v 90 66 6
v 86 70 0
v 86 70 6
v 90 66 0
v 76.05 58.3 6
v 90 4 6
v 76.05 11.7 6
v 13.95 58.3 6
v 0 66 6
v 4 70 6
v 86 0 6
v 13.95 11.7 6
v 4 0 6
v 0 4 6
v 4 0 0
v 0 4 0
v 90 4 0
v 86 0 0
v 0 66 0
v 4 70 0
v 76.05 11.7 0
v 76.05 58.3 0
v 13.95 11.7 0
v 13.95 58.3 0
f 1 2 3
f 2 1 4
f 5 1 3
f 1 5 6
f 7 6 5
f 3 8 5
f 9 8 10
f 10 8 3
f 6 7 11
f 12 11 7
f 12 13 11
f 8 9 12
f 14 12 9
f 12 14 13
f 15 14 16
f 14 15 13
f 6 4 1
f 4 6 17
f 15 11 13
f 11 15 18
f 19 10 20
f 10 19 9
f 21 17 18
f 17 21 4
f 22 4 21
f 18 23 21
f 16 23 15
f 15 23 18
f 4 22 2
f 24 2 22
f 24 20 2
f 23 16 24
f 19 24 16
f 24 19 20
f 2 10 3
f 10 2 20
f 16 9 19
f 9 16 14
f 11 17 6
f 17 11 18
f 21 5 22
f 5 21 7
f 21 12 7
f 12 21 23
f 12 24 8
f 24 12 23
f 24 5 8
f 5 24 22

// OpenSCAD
$fn = 32;

// ----------------------------------------------------------------------
// Windowed plate: 1 voids, 90 x 70 x 6 mm
// ----------------------------------------------------------------------

// --- parameters (mm) ---
plate_l = 90;             // plate length, X
plate_w = 70;             // plate width, Y
plate_t = 6;              // plate thickness, Z
edge_margin = 8;          // wall from the plate edge to any window
win1_l = 62.1;            // window length
win1_w = 46.6;            // window width
depth_1 = 6;              // depth of void 1 (full thickness = through)
corner_c = 4;             // corner chamfer of the plate

profile = [[4, 0], [86, 0], [90, 4], [90, 66], [86, 70], [4, 70], [0, 66], [0, 4]];  // primary outline, 8 points, counter clockwise
void_1 = [[13.95, 11.7], [76.05, 11.7], [76.05, 58.3], [13.95, 58.3]];  // large central window, 4 points

// --- the one profile operation ---
difference() {
  linear_extrude(height = plate_t) polygon(points = profile);
  translate([0, 0, -1])
    linear_extrude(height = plate_t + 2) polygon(points = void_1);
}
